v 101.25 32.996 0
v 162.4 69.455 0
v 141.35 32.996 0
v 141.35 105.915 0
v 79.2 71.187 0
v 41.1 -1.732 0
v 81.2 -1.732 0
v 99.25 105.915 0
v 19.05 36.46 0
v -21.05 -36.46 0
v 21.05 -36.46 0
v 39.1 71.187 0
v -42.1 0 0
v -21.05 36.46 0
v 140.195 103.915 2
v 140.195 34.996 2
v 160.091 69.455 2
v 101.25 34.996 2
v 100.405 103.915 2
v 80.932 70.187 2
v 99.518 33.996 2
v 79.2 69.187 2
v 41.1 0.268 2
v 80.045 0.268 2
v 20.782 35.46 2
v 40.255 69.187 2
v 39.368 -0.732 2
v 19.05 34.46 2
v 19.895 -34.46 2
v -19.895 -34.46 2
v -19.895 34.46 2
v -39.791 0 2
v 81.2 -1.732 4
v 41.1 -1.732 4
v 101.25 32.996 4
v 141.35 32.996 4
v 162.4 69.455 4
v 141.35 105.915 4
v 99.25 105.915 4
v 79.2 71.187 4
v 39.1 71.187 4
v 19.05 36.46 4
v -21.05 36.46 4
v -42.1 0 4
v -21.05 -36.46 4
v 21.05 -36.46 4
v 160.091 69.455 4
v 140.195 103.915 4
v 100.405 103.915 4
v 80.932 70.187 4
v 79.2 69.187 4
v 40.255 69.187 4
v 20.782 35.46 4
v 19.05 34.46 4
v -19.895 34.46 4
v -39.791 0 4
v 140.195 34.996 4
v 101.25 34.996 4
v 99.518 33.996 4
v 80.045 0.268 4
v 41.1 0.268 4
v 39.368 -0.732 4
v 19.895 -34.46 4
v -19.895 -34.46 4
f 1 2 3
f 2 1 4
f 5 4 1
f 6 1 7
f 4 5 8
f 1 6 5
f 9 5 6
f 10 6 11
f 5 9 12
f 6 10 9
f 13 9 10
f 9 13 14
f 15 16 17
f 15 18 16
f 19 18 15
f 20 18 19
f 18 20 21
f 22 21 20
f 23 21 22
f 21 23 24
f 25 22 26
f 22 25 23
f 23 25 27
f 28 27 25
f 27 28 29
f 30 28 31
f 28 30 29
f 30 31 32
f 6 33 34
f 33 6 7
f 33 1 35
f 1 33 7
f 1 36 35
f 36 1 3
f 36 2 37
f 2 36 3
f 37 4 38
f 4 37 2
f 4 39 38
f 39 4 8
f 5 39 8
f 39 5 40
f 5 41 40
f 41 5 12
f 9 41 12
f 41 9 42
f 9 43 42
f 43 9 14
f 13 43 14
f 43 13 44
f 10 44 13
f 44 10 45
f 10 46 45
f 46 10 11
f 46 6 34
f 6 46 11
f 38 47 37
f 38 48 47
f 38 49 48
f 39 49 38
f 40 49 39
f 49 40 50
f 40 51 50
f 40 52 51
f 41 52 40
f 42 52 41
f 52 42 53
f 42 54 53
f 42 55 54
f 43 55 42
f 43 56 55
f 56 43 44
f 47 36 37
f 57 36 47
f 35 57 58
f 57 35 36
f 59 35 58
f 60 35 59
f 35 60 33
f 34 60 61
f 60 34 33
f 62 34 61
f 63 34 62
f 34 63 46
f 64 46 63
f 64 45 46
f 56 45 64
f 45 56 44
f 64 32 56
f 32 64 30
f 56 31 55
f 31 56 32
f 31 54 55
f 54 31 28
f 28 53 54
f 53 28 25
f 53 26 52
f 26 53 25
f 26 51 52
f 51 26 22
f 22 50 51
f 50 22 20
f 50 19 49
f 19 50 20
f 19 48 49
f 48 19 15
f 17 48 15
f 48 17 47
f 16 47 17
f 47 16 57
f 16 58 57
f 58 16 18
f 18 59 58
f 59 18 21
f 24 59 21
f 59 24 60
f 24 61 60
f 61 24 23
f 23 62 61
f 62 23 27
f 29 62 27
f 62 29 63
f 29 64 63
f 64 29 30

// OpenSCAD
inch = 25.4;
hex_h = 2;
border_height = 2;
border_thickness = 2;
hex_r = 1.5 * inch;
num_hexs = 3;

module hexagons(count) {
    radius = hex_r + border_thickness;
    union() {
        for (i = [1 : count]) {
            echo(i);
            x_offset = radius * 1.5 * (i - 1);
            y_offset = cos(30) * radius * (i - 1);
            translate([x_offset, y_offset, 0]) {
                circle(r = radius + border_thickness, $fn = 6);
            }
        }
    }
}

// the object itself
linear_extrude(hex_h) {
   hexagons(num_hexs);
}

linear_extrude(hex_h + border_height) {
    difference() {
        // outer boundary
        hexagons(num_hexs);
        // remove an inset copy
        offset(-border_thickness) {
            hexagons(num_hexs); 
        }
    }
}
